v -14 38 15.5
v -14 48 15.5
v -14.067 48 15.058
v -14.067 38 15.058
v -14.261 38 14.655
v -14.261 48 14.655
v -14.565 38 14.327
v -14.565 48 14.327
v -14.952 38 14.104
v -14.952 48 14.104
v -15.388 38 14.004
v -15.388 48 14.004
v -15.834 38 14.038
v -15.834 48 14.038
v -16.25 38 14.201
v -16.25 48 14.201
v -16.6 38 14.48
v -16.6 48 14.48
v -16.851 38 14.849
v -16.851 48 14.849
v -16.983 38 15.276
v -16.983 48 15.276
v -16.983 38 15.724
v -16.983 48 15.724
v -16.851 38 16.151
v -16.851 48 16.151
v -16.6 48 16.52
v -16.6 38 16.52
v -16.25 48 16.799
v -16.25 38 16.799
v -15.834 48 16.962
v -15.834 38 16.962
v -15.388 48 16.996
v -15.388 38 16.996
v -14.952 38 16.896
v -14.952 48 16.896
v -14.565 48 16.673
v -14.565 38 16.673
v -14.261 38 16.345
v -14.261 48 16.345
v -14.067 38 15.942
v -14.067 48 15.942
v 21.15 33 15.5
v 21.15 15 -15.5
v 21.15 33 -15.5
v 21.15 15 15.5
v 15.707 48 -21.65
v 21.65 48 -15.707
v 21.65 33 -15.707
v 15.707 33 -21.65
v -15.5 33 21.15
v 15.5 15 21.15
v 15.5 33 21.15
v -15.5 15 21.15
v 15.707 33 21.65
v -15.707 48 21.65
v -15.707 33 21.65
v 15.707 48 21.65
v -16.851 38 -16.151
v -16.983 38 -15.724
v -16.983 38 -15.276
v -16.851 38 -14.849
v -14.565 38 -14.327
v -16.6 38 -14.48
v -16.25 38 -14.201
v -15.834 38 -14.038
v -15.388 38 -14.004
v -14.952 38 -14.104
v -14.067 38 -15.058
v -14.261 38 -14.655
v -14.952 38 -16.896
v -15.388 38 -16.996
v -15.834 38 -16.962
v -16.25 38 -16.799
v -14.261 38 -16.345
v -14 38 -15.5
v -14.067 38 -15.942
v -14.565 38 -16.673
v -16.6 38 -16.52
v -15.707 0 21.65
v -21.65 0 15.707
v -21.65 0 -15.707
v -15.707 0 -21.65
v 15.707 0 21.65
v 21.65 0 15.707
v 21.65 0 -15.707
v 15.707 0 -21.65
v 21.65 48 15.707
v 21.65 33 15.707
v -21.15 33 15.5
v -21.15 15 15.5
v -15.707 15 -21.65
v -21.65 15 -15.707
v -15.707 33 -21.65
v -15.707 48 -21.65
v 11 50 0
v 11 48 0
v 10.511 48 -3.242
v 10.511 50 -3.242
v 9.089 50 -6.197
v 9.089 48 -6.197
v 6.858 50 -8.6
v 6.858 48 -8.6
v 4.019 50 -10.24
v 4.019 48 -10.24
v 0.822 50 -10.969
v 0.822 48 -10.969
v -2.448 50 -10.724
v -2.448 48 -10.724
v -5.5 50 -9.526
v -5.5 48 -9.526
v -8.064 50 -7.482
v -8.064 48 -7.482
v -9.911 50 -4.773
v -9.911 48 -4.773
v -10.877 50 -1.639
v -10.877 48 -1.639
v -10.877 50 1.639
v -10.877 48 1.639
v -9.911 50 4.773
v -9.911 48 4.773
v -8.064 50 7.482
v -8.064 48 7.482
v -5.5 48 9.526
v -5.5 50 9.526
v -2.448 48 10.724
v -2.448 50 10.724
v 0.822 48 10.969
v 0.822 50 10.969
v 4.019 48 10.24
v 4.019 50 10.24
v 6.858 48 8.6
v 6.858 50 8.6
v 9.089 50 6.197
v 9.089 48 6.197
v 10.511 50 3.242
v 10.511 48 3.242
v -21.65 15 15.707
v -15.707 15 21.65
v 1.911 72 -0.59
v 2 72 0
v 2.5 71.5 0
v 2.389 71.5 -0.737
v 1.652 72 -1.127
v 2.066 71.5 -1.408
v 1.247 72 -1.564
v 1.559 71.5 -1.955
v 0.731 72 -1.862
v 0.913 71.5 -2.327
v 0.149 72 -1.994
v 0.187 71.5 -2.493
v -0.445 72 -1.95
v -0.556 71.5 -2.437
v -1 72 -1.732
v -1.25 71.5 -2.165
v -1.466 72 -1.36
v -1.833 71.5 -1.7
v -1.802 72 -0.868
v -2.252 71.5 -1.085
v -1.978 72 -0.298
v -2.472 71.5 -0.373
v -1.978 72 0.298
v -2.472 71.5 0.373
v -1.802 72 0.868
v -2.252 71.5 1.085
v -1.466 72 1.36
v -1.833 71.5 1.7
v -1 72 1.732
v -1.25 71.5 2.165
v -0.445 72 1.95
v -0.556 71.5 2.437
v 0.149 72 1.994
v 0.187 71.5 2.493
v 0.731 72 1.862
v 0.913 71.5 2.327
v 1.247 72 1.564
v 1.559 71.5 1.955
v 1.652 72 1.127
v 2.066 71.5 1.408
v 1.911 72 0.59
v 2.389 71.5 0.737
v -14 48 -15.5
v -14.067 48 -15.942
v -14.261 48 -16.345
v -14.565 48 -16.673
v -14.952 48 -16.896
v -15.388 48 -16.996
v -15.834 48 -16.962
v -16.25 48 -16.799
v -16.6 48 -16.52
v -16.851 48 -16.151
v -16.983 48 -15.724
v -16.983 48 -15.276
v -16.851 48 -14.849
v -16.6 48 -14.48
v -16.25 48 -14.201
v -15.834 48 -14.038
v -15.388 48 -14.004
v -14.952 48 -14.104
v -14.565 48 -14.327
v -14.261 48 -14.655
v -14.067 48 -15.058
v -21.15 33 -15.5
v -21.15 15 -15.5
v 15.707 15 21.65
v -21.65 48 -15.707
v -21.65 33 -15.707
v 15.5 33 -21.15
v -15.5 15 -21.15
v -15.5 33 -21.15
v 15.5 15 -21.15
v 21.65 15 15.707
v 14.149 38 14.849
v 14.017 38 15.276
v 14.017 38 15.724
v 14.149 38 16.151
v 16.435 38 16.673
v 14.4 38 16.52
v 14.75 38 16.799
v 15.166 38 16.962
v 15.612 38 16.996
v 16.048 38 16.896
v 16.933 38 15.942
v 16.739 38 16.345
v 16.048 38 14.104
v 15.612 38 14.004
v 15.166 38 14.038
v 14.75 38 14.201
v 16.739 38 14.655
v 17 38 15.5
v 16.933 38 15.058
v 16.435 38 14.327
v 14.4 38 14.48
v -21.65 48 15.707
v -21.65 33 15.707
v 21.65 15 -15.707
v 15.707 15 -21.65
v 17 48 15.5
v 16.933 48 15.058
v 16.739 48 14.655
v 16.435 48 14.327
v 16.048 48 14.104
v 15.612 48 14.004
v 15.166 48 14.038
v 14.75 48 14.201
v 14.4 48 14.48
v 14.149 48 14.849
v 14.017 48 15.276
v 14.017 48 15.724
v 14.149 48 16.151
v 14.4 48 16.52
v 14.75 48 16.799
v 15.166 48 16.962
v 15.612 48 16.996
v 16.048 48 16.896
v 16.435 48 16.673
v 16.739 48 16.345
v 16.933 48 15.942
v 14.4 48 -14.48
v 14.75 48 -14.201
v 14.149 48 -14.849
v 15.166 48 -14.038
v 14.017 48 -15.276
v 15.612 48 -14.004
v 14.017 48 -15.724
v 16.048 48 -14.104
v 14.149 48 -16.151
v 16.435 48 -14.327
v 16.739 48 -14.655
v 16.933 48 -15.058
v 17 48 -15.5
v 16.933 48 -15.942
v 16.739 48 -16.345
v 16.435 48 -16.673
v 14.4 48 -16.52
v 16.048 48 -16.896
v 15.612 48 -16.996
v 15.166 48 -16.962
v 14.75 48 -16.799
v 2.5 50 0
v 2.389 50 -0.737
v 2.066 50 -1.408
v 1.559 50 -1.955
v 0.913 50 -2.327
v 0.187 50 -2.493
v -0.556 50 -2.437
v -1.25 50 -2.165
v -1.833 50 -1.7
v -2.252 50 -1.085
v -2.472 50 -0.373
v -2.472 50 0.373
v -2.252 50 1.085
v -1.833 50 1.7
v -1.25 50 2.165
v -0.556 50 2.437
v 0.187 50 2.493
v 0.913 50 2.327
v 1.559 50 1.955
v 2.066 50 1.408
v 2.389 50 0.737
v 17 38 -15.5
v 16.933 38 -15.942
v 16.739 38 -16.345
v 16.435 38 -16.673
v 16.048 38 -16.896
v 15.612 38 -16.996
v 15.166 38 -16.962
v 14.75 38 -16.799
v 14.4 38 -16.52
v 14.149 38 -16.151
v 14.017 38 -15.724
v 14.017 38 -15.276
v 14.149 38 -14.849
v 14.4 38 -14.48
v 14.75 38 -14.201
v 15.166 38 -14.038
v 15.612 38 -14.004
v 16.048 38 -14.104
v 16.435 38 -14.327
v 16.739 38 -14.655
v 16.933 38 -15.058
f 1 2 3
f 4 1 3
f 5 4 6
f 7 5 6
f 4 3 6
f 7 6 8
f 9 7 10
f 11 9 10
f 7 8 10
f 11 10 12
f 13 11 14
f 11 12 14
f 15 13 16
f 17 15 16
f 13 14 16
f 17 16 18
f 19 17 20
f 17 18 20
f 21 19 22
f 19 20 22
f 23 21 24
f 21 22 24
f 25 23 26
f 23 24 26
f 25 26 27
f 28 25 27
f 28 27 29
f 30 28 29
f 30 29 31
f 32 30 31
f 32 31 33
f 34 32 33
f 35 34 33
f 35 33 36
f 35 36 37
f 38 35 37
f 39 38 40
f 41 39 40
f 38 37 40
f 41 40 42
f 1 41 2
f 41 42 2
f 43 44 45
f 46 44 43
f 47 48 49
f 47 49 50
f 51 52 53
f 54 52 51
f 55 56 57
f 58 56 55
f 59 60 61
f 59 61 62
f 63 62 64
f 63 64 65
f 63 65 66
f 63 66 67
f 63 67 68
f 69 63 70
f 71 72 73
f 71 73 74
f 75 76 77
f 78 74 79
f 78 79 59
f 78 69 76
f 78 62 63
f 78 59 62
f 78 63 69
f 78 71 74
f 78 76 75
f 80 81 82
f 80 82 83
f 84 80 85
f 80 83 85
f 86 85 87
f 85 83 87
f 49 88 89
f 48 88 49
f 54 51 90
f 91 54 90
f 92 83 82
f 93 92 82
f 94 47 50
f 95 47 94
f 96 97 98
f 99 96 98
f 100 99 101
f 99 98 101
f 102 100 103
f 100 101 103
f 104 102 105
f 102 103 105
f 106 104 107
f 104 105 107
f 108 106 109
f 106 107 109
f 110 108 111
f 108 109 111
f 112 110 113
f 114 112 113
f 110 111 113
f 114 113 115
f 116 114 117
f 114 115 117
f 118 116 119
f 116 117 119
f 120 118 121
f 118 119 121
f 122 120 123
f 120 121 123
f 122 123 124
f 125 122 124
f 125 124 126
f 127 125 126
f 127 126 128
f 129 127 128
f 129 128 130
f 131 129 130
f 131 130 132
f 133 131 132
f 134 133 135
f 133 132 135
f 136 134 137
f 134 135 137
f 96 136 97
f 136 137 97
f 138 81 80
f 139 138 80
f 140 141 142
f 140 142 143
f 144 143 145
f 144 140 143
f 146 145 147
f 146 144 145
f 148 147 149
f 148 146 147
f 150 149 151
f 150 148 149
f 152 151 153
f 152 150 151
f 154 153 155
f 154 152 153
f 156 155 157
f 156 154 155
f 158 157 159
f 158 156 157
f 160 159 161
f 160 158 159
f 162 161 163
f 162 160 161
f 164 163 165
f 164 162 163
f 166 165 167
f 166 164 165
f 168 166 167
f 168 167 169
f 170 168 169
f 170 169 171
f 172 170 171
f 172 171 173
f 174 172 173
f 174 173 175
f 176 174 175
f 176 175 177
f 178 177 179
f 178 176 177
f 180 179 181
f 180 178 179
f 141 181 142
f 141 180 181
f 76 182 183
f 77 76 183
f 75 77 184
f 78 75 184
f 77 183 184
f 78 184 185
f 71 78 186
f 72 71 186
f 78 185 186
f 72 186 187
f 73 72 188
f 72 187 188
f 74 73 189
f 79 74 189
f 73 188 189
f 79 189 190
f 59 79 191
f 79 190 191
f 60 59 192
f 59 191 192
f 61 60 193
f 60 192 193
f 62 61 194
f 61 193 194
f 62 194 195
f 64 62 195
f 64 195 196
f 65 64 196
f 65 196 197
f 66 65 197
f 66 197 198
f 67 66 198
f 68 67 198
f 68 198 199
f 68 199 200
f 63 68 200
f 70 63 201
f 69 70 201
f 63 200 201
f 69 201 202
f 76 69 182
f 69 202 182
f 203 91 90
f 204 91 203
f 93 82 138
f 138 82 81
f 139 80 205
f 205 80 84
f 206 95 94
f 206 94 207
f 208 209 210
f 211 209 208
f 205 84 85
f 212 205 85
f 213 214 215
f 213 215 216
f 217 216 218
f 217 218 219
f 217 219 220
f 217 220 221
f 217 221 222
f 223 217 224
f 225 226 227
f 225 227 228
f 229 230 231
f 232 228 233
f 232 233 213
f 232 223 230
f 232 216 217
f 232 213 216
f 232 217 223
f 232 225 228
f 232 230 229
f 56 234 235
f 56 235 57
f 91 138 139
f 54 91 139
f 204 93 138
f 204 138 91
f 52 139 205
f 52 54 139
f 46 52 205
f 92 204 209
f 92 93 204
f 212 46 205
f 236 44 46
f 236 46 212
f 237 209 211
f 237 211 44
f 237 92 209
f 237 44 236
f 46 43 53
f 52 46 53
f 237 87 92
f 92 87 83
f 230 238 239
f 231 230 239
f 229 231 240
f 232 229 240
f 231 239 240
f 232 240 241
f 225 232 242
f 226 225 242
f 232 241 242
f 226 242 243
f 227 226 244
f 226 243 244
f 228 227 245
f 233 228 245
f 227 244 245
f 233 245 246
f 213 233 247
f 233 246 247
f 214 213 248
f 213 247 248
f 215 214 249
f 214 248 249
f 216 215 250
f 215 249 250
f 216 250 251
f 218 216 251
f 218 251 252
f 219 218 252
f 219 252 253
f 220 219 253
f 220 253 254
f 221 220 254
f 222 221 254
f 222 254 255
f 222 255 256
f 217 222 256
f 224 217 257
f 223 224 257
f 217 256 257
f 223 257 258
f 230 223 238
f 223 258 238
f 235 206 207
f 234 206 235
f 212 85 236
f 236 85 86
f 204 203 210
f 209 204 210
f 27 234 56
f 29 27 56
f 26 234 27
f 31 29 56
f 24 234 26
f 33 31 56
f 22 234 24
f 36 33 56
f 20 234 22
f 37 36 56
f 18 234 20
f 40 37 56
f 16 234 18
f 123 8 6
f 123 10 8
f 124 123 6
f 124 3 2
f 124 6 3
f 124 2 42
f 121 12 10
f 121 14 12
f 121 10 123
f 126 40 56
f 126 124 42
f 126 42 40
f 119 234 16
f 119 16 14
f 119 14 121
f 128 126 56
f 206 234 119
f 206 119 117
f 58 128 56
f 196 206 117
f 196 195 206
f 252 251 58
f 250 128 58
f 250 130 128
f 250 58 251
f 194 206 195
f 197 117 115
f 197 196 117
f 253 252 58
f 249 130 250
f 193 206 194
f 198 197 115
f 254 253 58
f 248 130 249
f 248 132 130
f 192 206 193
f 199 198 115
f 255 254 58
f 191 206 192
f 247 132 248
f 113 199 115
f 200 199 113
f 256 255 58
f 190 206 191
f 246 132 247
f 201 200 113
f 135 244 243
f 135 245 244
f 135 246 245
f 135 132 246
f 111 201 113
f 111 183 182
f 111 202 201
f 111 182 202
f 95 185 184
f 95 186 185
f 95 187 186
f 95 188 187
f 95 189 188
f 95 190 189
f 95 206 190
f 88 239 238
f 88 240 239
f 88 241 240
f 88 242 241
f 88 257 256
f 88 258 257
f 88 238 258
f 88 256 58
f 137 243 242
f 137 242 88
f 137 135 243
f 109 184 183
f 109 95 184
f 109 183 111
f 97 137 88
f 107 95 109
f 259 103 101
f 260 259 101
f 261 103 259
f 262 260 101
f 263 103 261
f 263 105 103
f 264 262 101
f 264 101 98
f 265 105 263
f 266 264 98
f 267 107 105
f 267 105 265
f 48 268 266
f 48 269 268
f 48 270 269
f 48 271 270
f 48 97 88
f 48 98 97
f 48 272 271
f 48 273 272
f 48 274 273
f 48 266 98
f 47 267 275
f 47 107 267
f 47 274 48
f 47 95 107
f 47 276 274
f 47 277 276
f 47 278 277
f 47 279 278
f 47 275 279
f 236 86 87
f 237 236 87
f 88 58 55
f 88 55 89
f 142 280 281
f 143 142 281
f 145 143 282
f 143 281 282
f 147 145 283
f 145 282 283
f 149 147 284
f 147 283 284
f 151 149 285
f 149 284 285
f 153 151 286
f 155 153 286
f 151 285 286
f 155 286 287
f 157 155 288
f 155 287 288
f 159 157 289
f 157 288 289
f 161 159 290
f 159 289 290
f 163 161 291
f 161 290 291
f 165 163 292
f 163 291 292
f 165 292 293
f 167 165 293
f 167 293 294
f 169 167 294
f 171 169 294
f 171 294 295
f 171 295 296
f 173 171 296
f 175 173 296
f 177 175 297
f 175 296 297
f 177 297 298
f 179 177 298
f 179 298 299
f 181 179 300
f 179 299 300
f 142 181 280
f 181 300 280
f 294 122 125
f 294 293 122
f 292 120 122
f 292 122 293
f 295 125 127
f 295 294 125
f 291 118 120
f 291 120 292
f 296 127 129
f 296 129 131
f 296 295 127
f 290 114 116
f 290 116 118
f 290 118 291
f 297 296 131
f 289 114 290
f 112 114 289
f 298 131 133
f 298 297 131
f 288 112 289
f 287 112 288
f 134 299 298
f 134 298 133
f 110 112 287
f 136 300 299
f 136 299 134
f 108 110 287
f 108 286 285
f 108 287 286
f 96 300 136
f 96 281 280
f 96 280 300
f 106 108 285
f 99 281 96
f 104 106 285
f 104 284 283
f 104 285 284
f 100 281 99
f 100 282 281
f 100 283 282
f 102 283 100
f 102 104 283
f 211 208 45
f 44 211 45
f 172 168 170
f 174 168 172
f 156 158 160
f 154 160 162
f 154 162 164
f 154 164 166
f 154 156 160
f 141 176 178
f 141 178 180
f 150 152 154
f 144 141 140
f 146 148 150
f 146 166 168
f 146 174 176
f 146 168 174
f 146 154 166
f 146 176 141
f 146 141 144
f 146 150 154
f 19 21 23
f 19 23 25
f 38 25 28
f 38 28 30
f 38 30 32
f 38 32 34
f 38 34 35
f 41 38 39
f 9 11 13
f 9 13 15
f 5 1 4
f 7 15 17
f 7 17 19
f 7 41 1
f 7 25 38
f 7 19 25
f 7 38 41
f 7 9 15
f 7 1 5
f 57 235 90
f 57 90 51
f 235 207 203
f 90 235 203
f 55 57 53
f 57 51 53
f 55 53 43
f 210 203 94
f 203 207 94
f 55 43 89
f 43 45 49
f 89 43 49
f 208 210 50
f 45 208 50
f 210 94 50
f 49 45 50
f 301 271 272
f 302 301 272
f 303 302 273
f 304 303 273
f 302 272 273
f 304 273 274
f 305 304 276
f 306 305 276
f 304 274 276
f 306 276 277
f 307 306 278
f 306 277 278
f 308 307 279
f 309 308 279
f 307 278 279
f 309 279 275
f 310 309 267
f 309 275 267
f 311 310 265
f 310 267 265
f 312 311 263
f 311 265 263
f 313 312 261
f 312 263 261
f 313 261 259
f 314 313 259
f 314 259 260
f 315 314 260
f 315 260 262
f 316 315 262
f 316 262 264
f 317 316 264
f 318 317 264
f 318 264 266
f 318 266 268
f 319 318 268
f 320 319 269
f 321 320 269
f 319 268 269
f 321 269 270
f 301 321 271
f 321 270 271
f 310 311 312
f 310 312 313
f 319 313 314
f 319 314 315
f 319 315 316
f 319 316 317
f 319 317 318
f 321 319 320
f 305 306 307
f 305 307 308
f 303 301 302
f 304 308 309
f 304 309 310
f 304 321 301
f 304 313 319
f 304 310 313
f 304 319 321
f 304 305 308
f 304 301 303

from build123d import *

# Parameters (mm, degrees)
BOSS_EXTRUDE1_DEPTH = 48
SKETCH2_R           = 11
BOSS_EXTRUDE2_DEPTH = 2
SKETCH3_R           = 2.5
BOSS_EXTRUDE3_DEPTH = 22
CHAMFER1_SIZE       = 0.5
SKETCH4_R           = 1.5
CUT_EXTRUDE1_DEPTH  = 10
BOSS_EXTRUDE5_DEPTH = 15


with BuildPart() as part:
    # Sketch1 → Boss-Extrude1 (new body)
    with BuildSketch(Plane(origin=(0, 0, 0), x_dir=(1, 0, 0), z_dir=(0, 1, 0))):
        Polygon((15.5, 21.15), (21.15, 15.5), (21.15, -15.5), (15.5, -21.15), (-15.5, -21.15), (-21.15, -15.5), (-21.15, 15.5), (-15.5, 21.15), align=None)
    extrude(amount=BOSS_EXTRUDE1_DEPTH)

    # Sketch2 → Boss-Extrude2 (add)
    with BuildSketch(Plane(origin=(0, 48, 0), x_dir=(1, 0, 0), z_dir=(0, 1, 0))):
        Circle(SKETCH2_R)
    extrude(amount=BOSS_EXTRUDE2_DEPTH)

    # Sketch3 → Boss-Extrude3 (add)
    with BuildSketch(Plane(origin=(0, 50, 0), x_dir=(1, 0, 0), z_dir=(0, 1, 0))):
        Circle(SKETCH3_R)
    extrude(amount=BOSS_EXTRUDE3_DEPTH)

    # Chamfer1
    chamfer1_edges = [part.edges().sort_by_distance(p)[0] for p in [
        (-2.5, 72, 0),
    ]]
    chamfer(chamfer1_edges, length=CHAMFER1_SIZE)

    # Sketch4 → Cut-Extrude1 (cut)
    with BuildSketch(Plane(origin=(0, 48, 0), x_dir=(1, 0, 0), z_dir=(0, 1, 0))):
        with Locations((-15.5, 15.5)):
            Circle(SKETCH4_R)
        with Locations((15.5, 15.5)):
            Circle(SKETCH4_R)
        with Locations((15.5, -15.5)):
            Circle(SKETCH4_R)
        with Locations((-15.5, -15.5)):
            Circle(SKETCH4_R)
    extrude(amount=-CUT_EXTRUDE1_DEPTH, mode=Mode.SUBTRACT)

    # Sketch6 → Boss-Extrude5 (add)
    with BuildSketch(Plane(origin=(0, 48, 0), x_dir=(1, 0, 0), z_dir=(0, 1, 0))):
        Polygon((-21.65, -15.707106781), (-15.707106781, -21.65), (15.707106781, -21.65), (21.65, -15.707106781), (21.65, 15.707106781), (15.707106781, 21.65), (-15.707106781, 21.65), (-21.65, 15.707106781), align=None)
        Polygon((-21.15, -15.5), (-15.5, -21.15), (15.5, -21.15), (21.15, -15.5), (21.15, 15.5), (15.5, 21.15), (-15.5, 21.15), (-21.15, 15.5), align=None, mode=Mode.SUBTRACT)
    boss_extrude5 = extrude(amount=-BOSS_EXTRUDE5_DEPTH)

    # Mirror1: Boss-Extrude5 across plane
    add(boss_extrude5.mirror(Plane.ZX.offset(24)))


solid = part.part
